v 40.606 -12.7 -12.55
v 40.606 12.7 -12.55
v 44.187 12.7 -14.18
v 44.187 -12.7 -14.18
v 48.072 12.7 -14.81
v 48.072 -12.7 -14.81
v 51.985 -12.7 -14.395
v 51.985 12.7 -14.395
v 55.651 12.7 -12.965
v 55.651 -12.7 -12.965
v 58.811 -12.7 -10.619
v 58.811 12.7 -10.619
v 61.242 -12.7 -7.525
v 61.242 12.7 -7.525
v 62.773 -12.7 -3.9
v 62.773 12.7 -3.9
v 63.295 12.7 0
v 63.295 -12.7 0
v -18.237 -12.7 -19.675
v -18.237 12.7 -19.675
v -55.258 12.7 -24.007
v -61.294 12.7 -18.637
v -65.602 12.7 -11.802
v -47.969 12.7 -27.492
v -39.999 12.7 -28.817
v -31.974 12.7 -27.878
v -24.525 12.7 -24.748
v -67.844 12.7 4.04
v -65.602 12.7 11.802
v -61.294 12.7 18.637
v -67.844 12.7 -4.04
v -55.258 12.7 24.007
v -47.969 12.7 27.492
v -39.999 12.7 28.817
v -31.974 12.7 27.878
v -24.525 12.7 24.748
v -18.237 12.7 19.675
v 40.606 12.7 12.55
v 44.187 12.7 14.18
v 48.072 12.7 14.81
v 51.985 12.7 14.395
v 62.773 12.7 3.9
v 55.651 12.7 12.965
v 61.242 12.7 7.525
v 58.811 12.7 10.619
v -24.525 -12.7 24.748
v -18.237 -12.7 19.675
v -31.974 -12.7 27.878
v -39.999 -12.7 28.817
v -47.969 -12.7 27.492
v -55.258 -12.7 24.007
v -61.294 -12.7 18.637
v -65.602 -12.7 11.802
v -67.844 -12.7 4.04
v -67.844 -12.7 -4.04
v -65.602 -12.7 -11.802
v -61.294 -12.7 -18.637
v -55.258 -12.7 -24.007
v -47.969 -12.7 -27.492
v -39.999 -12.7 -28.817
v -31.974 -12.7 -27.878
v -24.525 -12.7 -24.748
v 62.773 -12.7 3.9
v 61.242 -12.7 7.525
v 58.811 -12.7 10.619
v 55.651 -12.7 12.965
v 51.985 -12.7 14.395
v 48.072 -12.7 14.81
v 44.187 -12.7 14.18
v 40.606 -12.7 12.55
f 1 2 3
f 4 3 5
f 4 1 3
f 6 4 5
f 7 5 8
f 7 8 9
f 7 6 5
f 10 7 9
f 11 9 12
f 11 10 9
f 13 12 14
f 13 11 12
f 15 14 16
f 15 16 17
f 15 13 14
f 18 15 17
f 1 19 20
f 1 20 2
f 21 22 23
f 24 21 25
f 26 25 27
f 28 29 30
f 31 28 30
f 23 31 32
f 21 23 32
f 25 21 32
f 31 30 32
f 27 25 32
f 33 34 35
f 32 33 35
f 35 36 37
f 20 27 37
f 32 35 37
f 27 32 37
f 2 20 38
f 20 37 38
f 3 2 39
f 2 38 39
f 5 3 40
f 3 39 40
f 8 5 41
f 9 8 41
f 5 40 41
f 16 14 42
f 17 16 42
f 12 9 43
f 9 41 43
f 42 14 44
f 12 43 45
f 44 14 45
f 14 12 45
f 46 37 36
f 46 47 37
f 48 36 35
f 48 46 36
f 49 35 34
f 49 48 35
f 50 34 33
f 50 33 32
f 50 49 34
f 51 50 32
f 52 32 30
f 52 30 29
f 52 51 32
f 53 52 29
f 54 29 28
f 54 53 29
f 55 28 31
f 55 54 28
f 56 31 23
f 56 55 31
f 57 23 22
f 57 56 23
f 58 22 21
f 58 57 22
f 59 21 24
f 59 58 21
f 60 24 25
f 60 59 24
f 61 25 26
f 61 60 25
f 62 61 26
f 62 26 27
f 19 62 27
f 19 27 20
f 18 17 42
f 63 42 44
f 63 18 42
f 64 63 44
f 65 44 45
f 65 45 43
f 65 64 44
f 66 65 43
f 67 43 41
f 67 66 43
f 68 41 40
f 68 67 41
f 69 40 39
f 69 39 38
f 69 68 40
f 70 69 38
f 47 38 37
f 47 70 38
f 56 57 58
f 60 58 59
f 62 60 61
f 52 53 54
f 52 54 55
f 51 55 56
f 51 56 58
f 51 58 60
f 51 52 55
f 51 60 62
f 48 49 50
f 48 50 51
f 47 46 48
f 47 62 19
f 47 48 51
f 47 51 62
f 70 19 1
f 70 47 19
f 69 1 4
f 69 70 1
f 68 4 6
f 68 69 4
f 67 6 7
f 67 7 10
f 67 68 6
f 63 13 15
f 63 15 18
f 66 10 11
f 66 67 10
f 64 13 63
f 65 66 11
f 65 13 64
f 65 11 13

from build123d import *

# Parameters (mm, degrees)
F1_DEPTH = 12.7


with BuildPart() as f1:
    # F0 (on Front) → F1 (new body, symmetric)
    with BuildSketch(Plane.XZ):
        with BuildLine():
            ThreePointArc((-18.237302, -19.674743), (-12.488315, -10.574656), (-10.47857, 0))
            ThreePointArc((-10.47857, 0), (-12.488315, 10.574656), (-18.237302, 19.674743))
            ThreePointArc((-18.237302, 19.674743), (-68.128892, 0), (-18.237302, -19.674743))
        make_face()
        with BuildLine():
            ThreePointArc((-18.237302, 19.674743), (-12.488315, 10.574656), (-10.47857, 0))
            ThreePointArc((-10.47857, 0), (-12.488315, -10.574656), (-18.237302, -19.674743))
            Line((-18.237302, -19.674743), (40.605832, -12.550029))
            ThreePointArc((40.605832, -12.550029), (33.664157, 0), (40.605832, 12.550029))
            Line((40.605832, 12.550029), (-18.237302, 19.674743))
        make_face()
        with BuildLine():
            ThreePointArc((63.295345, 0), (55.650701, 12.96454), (40.605832, 12.550029))
            ThreePointArc((40.605832, 12.550029), (33.664157, 0), (40.605832, -12.550029))
            ThreePointArc((40.605832, -12.550029), (55.650701, -12.96454), (63.295345, 0))
        make_face()
    extrude(amount=F1_DEPTH, both=True)


solid = f1.part
